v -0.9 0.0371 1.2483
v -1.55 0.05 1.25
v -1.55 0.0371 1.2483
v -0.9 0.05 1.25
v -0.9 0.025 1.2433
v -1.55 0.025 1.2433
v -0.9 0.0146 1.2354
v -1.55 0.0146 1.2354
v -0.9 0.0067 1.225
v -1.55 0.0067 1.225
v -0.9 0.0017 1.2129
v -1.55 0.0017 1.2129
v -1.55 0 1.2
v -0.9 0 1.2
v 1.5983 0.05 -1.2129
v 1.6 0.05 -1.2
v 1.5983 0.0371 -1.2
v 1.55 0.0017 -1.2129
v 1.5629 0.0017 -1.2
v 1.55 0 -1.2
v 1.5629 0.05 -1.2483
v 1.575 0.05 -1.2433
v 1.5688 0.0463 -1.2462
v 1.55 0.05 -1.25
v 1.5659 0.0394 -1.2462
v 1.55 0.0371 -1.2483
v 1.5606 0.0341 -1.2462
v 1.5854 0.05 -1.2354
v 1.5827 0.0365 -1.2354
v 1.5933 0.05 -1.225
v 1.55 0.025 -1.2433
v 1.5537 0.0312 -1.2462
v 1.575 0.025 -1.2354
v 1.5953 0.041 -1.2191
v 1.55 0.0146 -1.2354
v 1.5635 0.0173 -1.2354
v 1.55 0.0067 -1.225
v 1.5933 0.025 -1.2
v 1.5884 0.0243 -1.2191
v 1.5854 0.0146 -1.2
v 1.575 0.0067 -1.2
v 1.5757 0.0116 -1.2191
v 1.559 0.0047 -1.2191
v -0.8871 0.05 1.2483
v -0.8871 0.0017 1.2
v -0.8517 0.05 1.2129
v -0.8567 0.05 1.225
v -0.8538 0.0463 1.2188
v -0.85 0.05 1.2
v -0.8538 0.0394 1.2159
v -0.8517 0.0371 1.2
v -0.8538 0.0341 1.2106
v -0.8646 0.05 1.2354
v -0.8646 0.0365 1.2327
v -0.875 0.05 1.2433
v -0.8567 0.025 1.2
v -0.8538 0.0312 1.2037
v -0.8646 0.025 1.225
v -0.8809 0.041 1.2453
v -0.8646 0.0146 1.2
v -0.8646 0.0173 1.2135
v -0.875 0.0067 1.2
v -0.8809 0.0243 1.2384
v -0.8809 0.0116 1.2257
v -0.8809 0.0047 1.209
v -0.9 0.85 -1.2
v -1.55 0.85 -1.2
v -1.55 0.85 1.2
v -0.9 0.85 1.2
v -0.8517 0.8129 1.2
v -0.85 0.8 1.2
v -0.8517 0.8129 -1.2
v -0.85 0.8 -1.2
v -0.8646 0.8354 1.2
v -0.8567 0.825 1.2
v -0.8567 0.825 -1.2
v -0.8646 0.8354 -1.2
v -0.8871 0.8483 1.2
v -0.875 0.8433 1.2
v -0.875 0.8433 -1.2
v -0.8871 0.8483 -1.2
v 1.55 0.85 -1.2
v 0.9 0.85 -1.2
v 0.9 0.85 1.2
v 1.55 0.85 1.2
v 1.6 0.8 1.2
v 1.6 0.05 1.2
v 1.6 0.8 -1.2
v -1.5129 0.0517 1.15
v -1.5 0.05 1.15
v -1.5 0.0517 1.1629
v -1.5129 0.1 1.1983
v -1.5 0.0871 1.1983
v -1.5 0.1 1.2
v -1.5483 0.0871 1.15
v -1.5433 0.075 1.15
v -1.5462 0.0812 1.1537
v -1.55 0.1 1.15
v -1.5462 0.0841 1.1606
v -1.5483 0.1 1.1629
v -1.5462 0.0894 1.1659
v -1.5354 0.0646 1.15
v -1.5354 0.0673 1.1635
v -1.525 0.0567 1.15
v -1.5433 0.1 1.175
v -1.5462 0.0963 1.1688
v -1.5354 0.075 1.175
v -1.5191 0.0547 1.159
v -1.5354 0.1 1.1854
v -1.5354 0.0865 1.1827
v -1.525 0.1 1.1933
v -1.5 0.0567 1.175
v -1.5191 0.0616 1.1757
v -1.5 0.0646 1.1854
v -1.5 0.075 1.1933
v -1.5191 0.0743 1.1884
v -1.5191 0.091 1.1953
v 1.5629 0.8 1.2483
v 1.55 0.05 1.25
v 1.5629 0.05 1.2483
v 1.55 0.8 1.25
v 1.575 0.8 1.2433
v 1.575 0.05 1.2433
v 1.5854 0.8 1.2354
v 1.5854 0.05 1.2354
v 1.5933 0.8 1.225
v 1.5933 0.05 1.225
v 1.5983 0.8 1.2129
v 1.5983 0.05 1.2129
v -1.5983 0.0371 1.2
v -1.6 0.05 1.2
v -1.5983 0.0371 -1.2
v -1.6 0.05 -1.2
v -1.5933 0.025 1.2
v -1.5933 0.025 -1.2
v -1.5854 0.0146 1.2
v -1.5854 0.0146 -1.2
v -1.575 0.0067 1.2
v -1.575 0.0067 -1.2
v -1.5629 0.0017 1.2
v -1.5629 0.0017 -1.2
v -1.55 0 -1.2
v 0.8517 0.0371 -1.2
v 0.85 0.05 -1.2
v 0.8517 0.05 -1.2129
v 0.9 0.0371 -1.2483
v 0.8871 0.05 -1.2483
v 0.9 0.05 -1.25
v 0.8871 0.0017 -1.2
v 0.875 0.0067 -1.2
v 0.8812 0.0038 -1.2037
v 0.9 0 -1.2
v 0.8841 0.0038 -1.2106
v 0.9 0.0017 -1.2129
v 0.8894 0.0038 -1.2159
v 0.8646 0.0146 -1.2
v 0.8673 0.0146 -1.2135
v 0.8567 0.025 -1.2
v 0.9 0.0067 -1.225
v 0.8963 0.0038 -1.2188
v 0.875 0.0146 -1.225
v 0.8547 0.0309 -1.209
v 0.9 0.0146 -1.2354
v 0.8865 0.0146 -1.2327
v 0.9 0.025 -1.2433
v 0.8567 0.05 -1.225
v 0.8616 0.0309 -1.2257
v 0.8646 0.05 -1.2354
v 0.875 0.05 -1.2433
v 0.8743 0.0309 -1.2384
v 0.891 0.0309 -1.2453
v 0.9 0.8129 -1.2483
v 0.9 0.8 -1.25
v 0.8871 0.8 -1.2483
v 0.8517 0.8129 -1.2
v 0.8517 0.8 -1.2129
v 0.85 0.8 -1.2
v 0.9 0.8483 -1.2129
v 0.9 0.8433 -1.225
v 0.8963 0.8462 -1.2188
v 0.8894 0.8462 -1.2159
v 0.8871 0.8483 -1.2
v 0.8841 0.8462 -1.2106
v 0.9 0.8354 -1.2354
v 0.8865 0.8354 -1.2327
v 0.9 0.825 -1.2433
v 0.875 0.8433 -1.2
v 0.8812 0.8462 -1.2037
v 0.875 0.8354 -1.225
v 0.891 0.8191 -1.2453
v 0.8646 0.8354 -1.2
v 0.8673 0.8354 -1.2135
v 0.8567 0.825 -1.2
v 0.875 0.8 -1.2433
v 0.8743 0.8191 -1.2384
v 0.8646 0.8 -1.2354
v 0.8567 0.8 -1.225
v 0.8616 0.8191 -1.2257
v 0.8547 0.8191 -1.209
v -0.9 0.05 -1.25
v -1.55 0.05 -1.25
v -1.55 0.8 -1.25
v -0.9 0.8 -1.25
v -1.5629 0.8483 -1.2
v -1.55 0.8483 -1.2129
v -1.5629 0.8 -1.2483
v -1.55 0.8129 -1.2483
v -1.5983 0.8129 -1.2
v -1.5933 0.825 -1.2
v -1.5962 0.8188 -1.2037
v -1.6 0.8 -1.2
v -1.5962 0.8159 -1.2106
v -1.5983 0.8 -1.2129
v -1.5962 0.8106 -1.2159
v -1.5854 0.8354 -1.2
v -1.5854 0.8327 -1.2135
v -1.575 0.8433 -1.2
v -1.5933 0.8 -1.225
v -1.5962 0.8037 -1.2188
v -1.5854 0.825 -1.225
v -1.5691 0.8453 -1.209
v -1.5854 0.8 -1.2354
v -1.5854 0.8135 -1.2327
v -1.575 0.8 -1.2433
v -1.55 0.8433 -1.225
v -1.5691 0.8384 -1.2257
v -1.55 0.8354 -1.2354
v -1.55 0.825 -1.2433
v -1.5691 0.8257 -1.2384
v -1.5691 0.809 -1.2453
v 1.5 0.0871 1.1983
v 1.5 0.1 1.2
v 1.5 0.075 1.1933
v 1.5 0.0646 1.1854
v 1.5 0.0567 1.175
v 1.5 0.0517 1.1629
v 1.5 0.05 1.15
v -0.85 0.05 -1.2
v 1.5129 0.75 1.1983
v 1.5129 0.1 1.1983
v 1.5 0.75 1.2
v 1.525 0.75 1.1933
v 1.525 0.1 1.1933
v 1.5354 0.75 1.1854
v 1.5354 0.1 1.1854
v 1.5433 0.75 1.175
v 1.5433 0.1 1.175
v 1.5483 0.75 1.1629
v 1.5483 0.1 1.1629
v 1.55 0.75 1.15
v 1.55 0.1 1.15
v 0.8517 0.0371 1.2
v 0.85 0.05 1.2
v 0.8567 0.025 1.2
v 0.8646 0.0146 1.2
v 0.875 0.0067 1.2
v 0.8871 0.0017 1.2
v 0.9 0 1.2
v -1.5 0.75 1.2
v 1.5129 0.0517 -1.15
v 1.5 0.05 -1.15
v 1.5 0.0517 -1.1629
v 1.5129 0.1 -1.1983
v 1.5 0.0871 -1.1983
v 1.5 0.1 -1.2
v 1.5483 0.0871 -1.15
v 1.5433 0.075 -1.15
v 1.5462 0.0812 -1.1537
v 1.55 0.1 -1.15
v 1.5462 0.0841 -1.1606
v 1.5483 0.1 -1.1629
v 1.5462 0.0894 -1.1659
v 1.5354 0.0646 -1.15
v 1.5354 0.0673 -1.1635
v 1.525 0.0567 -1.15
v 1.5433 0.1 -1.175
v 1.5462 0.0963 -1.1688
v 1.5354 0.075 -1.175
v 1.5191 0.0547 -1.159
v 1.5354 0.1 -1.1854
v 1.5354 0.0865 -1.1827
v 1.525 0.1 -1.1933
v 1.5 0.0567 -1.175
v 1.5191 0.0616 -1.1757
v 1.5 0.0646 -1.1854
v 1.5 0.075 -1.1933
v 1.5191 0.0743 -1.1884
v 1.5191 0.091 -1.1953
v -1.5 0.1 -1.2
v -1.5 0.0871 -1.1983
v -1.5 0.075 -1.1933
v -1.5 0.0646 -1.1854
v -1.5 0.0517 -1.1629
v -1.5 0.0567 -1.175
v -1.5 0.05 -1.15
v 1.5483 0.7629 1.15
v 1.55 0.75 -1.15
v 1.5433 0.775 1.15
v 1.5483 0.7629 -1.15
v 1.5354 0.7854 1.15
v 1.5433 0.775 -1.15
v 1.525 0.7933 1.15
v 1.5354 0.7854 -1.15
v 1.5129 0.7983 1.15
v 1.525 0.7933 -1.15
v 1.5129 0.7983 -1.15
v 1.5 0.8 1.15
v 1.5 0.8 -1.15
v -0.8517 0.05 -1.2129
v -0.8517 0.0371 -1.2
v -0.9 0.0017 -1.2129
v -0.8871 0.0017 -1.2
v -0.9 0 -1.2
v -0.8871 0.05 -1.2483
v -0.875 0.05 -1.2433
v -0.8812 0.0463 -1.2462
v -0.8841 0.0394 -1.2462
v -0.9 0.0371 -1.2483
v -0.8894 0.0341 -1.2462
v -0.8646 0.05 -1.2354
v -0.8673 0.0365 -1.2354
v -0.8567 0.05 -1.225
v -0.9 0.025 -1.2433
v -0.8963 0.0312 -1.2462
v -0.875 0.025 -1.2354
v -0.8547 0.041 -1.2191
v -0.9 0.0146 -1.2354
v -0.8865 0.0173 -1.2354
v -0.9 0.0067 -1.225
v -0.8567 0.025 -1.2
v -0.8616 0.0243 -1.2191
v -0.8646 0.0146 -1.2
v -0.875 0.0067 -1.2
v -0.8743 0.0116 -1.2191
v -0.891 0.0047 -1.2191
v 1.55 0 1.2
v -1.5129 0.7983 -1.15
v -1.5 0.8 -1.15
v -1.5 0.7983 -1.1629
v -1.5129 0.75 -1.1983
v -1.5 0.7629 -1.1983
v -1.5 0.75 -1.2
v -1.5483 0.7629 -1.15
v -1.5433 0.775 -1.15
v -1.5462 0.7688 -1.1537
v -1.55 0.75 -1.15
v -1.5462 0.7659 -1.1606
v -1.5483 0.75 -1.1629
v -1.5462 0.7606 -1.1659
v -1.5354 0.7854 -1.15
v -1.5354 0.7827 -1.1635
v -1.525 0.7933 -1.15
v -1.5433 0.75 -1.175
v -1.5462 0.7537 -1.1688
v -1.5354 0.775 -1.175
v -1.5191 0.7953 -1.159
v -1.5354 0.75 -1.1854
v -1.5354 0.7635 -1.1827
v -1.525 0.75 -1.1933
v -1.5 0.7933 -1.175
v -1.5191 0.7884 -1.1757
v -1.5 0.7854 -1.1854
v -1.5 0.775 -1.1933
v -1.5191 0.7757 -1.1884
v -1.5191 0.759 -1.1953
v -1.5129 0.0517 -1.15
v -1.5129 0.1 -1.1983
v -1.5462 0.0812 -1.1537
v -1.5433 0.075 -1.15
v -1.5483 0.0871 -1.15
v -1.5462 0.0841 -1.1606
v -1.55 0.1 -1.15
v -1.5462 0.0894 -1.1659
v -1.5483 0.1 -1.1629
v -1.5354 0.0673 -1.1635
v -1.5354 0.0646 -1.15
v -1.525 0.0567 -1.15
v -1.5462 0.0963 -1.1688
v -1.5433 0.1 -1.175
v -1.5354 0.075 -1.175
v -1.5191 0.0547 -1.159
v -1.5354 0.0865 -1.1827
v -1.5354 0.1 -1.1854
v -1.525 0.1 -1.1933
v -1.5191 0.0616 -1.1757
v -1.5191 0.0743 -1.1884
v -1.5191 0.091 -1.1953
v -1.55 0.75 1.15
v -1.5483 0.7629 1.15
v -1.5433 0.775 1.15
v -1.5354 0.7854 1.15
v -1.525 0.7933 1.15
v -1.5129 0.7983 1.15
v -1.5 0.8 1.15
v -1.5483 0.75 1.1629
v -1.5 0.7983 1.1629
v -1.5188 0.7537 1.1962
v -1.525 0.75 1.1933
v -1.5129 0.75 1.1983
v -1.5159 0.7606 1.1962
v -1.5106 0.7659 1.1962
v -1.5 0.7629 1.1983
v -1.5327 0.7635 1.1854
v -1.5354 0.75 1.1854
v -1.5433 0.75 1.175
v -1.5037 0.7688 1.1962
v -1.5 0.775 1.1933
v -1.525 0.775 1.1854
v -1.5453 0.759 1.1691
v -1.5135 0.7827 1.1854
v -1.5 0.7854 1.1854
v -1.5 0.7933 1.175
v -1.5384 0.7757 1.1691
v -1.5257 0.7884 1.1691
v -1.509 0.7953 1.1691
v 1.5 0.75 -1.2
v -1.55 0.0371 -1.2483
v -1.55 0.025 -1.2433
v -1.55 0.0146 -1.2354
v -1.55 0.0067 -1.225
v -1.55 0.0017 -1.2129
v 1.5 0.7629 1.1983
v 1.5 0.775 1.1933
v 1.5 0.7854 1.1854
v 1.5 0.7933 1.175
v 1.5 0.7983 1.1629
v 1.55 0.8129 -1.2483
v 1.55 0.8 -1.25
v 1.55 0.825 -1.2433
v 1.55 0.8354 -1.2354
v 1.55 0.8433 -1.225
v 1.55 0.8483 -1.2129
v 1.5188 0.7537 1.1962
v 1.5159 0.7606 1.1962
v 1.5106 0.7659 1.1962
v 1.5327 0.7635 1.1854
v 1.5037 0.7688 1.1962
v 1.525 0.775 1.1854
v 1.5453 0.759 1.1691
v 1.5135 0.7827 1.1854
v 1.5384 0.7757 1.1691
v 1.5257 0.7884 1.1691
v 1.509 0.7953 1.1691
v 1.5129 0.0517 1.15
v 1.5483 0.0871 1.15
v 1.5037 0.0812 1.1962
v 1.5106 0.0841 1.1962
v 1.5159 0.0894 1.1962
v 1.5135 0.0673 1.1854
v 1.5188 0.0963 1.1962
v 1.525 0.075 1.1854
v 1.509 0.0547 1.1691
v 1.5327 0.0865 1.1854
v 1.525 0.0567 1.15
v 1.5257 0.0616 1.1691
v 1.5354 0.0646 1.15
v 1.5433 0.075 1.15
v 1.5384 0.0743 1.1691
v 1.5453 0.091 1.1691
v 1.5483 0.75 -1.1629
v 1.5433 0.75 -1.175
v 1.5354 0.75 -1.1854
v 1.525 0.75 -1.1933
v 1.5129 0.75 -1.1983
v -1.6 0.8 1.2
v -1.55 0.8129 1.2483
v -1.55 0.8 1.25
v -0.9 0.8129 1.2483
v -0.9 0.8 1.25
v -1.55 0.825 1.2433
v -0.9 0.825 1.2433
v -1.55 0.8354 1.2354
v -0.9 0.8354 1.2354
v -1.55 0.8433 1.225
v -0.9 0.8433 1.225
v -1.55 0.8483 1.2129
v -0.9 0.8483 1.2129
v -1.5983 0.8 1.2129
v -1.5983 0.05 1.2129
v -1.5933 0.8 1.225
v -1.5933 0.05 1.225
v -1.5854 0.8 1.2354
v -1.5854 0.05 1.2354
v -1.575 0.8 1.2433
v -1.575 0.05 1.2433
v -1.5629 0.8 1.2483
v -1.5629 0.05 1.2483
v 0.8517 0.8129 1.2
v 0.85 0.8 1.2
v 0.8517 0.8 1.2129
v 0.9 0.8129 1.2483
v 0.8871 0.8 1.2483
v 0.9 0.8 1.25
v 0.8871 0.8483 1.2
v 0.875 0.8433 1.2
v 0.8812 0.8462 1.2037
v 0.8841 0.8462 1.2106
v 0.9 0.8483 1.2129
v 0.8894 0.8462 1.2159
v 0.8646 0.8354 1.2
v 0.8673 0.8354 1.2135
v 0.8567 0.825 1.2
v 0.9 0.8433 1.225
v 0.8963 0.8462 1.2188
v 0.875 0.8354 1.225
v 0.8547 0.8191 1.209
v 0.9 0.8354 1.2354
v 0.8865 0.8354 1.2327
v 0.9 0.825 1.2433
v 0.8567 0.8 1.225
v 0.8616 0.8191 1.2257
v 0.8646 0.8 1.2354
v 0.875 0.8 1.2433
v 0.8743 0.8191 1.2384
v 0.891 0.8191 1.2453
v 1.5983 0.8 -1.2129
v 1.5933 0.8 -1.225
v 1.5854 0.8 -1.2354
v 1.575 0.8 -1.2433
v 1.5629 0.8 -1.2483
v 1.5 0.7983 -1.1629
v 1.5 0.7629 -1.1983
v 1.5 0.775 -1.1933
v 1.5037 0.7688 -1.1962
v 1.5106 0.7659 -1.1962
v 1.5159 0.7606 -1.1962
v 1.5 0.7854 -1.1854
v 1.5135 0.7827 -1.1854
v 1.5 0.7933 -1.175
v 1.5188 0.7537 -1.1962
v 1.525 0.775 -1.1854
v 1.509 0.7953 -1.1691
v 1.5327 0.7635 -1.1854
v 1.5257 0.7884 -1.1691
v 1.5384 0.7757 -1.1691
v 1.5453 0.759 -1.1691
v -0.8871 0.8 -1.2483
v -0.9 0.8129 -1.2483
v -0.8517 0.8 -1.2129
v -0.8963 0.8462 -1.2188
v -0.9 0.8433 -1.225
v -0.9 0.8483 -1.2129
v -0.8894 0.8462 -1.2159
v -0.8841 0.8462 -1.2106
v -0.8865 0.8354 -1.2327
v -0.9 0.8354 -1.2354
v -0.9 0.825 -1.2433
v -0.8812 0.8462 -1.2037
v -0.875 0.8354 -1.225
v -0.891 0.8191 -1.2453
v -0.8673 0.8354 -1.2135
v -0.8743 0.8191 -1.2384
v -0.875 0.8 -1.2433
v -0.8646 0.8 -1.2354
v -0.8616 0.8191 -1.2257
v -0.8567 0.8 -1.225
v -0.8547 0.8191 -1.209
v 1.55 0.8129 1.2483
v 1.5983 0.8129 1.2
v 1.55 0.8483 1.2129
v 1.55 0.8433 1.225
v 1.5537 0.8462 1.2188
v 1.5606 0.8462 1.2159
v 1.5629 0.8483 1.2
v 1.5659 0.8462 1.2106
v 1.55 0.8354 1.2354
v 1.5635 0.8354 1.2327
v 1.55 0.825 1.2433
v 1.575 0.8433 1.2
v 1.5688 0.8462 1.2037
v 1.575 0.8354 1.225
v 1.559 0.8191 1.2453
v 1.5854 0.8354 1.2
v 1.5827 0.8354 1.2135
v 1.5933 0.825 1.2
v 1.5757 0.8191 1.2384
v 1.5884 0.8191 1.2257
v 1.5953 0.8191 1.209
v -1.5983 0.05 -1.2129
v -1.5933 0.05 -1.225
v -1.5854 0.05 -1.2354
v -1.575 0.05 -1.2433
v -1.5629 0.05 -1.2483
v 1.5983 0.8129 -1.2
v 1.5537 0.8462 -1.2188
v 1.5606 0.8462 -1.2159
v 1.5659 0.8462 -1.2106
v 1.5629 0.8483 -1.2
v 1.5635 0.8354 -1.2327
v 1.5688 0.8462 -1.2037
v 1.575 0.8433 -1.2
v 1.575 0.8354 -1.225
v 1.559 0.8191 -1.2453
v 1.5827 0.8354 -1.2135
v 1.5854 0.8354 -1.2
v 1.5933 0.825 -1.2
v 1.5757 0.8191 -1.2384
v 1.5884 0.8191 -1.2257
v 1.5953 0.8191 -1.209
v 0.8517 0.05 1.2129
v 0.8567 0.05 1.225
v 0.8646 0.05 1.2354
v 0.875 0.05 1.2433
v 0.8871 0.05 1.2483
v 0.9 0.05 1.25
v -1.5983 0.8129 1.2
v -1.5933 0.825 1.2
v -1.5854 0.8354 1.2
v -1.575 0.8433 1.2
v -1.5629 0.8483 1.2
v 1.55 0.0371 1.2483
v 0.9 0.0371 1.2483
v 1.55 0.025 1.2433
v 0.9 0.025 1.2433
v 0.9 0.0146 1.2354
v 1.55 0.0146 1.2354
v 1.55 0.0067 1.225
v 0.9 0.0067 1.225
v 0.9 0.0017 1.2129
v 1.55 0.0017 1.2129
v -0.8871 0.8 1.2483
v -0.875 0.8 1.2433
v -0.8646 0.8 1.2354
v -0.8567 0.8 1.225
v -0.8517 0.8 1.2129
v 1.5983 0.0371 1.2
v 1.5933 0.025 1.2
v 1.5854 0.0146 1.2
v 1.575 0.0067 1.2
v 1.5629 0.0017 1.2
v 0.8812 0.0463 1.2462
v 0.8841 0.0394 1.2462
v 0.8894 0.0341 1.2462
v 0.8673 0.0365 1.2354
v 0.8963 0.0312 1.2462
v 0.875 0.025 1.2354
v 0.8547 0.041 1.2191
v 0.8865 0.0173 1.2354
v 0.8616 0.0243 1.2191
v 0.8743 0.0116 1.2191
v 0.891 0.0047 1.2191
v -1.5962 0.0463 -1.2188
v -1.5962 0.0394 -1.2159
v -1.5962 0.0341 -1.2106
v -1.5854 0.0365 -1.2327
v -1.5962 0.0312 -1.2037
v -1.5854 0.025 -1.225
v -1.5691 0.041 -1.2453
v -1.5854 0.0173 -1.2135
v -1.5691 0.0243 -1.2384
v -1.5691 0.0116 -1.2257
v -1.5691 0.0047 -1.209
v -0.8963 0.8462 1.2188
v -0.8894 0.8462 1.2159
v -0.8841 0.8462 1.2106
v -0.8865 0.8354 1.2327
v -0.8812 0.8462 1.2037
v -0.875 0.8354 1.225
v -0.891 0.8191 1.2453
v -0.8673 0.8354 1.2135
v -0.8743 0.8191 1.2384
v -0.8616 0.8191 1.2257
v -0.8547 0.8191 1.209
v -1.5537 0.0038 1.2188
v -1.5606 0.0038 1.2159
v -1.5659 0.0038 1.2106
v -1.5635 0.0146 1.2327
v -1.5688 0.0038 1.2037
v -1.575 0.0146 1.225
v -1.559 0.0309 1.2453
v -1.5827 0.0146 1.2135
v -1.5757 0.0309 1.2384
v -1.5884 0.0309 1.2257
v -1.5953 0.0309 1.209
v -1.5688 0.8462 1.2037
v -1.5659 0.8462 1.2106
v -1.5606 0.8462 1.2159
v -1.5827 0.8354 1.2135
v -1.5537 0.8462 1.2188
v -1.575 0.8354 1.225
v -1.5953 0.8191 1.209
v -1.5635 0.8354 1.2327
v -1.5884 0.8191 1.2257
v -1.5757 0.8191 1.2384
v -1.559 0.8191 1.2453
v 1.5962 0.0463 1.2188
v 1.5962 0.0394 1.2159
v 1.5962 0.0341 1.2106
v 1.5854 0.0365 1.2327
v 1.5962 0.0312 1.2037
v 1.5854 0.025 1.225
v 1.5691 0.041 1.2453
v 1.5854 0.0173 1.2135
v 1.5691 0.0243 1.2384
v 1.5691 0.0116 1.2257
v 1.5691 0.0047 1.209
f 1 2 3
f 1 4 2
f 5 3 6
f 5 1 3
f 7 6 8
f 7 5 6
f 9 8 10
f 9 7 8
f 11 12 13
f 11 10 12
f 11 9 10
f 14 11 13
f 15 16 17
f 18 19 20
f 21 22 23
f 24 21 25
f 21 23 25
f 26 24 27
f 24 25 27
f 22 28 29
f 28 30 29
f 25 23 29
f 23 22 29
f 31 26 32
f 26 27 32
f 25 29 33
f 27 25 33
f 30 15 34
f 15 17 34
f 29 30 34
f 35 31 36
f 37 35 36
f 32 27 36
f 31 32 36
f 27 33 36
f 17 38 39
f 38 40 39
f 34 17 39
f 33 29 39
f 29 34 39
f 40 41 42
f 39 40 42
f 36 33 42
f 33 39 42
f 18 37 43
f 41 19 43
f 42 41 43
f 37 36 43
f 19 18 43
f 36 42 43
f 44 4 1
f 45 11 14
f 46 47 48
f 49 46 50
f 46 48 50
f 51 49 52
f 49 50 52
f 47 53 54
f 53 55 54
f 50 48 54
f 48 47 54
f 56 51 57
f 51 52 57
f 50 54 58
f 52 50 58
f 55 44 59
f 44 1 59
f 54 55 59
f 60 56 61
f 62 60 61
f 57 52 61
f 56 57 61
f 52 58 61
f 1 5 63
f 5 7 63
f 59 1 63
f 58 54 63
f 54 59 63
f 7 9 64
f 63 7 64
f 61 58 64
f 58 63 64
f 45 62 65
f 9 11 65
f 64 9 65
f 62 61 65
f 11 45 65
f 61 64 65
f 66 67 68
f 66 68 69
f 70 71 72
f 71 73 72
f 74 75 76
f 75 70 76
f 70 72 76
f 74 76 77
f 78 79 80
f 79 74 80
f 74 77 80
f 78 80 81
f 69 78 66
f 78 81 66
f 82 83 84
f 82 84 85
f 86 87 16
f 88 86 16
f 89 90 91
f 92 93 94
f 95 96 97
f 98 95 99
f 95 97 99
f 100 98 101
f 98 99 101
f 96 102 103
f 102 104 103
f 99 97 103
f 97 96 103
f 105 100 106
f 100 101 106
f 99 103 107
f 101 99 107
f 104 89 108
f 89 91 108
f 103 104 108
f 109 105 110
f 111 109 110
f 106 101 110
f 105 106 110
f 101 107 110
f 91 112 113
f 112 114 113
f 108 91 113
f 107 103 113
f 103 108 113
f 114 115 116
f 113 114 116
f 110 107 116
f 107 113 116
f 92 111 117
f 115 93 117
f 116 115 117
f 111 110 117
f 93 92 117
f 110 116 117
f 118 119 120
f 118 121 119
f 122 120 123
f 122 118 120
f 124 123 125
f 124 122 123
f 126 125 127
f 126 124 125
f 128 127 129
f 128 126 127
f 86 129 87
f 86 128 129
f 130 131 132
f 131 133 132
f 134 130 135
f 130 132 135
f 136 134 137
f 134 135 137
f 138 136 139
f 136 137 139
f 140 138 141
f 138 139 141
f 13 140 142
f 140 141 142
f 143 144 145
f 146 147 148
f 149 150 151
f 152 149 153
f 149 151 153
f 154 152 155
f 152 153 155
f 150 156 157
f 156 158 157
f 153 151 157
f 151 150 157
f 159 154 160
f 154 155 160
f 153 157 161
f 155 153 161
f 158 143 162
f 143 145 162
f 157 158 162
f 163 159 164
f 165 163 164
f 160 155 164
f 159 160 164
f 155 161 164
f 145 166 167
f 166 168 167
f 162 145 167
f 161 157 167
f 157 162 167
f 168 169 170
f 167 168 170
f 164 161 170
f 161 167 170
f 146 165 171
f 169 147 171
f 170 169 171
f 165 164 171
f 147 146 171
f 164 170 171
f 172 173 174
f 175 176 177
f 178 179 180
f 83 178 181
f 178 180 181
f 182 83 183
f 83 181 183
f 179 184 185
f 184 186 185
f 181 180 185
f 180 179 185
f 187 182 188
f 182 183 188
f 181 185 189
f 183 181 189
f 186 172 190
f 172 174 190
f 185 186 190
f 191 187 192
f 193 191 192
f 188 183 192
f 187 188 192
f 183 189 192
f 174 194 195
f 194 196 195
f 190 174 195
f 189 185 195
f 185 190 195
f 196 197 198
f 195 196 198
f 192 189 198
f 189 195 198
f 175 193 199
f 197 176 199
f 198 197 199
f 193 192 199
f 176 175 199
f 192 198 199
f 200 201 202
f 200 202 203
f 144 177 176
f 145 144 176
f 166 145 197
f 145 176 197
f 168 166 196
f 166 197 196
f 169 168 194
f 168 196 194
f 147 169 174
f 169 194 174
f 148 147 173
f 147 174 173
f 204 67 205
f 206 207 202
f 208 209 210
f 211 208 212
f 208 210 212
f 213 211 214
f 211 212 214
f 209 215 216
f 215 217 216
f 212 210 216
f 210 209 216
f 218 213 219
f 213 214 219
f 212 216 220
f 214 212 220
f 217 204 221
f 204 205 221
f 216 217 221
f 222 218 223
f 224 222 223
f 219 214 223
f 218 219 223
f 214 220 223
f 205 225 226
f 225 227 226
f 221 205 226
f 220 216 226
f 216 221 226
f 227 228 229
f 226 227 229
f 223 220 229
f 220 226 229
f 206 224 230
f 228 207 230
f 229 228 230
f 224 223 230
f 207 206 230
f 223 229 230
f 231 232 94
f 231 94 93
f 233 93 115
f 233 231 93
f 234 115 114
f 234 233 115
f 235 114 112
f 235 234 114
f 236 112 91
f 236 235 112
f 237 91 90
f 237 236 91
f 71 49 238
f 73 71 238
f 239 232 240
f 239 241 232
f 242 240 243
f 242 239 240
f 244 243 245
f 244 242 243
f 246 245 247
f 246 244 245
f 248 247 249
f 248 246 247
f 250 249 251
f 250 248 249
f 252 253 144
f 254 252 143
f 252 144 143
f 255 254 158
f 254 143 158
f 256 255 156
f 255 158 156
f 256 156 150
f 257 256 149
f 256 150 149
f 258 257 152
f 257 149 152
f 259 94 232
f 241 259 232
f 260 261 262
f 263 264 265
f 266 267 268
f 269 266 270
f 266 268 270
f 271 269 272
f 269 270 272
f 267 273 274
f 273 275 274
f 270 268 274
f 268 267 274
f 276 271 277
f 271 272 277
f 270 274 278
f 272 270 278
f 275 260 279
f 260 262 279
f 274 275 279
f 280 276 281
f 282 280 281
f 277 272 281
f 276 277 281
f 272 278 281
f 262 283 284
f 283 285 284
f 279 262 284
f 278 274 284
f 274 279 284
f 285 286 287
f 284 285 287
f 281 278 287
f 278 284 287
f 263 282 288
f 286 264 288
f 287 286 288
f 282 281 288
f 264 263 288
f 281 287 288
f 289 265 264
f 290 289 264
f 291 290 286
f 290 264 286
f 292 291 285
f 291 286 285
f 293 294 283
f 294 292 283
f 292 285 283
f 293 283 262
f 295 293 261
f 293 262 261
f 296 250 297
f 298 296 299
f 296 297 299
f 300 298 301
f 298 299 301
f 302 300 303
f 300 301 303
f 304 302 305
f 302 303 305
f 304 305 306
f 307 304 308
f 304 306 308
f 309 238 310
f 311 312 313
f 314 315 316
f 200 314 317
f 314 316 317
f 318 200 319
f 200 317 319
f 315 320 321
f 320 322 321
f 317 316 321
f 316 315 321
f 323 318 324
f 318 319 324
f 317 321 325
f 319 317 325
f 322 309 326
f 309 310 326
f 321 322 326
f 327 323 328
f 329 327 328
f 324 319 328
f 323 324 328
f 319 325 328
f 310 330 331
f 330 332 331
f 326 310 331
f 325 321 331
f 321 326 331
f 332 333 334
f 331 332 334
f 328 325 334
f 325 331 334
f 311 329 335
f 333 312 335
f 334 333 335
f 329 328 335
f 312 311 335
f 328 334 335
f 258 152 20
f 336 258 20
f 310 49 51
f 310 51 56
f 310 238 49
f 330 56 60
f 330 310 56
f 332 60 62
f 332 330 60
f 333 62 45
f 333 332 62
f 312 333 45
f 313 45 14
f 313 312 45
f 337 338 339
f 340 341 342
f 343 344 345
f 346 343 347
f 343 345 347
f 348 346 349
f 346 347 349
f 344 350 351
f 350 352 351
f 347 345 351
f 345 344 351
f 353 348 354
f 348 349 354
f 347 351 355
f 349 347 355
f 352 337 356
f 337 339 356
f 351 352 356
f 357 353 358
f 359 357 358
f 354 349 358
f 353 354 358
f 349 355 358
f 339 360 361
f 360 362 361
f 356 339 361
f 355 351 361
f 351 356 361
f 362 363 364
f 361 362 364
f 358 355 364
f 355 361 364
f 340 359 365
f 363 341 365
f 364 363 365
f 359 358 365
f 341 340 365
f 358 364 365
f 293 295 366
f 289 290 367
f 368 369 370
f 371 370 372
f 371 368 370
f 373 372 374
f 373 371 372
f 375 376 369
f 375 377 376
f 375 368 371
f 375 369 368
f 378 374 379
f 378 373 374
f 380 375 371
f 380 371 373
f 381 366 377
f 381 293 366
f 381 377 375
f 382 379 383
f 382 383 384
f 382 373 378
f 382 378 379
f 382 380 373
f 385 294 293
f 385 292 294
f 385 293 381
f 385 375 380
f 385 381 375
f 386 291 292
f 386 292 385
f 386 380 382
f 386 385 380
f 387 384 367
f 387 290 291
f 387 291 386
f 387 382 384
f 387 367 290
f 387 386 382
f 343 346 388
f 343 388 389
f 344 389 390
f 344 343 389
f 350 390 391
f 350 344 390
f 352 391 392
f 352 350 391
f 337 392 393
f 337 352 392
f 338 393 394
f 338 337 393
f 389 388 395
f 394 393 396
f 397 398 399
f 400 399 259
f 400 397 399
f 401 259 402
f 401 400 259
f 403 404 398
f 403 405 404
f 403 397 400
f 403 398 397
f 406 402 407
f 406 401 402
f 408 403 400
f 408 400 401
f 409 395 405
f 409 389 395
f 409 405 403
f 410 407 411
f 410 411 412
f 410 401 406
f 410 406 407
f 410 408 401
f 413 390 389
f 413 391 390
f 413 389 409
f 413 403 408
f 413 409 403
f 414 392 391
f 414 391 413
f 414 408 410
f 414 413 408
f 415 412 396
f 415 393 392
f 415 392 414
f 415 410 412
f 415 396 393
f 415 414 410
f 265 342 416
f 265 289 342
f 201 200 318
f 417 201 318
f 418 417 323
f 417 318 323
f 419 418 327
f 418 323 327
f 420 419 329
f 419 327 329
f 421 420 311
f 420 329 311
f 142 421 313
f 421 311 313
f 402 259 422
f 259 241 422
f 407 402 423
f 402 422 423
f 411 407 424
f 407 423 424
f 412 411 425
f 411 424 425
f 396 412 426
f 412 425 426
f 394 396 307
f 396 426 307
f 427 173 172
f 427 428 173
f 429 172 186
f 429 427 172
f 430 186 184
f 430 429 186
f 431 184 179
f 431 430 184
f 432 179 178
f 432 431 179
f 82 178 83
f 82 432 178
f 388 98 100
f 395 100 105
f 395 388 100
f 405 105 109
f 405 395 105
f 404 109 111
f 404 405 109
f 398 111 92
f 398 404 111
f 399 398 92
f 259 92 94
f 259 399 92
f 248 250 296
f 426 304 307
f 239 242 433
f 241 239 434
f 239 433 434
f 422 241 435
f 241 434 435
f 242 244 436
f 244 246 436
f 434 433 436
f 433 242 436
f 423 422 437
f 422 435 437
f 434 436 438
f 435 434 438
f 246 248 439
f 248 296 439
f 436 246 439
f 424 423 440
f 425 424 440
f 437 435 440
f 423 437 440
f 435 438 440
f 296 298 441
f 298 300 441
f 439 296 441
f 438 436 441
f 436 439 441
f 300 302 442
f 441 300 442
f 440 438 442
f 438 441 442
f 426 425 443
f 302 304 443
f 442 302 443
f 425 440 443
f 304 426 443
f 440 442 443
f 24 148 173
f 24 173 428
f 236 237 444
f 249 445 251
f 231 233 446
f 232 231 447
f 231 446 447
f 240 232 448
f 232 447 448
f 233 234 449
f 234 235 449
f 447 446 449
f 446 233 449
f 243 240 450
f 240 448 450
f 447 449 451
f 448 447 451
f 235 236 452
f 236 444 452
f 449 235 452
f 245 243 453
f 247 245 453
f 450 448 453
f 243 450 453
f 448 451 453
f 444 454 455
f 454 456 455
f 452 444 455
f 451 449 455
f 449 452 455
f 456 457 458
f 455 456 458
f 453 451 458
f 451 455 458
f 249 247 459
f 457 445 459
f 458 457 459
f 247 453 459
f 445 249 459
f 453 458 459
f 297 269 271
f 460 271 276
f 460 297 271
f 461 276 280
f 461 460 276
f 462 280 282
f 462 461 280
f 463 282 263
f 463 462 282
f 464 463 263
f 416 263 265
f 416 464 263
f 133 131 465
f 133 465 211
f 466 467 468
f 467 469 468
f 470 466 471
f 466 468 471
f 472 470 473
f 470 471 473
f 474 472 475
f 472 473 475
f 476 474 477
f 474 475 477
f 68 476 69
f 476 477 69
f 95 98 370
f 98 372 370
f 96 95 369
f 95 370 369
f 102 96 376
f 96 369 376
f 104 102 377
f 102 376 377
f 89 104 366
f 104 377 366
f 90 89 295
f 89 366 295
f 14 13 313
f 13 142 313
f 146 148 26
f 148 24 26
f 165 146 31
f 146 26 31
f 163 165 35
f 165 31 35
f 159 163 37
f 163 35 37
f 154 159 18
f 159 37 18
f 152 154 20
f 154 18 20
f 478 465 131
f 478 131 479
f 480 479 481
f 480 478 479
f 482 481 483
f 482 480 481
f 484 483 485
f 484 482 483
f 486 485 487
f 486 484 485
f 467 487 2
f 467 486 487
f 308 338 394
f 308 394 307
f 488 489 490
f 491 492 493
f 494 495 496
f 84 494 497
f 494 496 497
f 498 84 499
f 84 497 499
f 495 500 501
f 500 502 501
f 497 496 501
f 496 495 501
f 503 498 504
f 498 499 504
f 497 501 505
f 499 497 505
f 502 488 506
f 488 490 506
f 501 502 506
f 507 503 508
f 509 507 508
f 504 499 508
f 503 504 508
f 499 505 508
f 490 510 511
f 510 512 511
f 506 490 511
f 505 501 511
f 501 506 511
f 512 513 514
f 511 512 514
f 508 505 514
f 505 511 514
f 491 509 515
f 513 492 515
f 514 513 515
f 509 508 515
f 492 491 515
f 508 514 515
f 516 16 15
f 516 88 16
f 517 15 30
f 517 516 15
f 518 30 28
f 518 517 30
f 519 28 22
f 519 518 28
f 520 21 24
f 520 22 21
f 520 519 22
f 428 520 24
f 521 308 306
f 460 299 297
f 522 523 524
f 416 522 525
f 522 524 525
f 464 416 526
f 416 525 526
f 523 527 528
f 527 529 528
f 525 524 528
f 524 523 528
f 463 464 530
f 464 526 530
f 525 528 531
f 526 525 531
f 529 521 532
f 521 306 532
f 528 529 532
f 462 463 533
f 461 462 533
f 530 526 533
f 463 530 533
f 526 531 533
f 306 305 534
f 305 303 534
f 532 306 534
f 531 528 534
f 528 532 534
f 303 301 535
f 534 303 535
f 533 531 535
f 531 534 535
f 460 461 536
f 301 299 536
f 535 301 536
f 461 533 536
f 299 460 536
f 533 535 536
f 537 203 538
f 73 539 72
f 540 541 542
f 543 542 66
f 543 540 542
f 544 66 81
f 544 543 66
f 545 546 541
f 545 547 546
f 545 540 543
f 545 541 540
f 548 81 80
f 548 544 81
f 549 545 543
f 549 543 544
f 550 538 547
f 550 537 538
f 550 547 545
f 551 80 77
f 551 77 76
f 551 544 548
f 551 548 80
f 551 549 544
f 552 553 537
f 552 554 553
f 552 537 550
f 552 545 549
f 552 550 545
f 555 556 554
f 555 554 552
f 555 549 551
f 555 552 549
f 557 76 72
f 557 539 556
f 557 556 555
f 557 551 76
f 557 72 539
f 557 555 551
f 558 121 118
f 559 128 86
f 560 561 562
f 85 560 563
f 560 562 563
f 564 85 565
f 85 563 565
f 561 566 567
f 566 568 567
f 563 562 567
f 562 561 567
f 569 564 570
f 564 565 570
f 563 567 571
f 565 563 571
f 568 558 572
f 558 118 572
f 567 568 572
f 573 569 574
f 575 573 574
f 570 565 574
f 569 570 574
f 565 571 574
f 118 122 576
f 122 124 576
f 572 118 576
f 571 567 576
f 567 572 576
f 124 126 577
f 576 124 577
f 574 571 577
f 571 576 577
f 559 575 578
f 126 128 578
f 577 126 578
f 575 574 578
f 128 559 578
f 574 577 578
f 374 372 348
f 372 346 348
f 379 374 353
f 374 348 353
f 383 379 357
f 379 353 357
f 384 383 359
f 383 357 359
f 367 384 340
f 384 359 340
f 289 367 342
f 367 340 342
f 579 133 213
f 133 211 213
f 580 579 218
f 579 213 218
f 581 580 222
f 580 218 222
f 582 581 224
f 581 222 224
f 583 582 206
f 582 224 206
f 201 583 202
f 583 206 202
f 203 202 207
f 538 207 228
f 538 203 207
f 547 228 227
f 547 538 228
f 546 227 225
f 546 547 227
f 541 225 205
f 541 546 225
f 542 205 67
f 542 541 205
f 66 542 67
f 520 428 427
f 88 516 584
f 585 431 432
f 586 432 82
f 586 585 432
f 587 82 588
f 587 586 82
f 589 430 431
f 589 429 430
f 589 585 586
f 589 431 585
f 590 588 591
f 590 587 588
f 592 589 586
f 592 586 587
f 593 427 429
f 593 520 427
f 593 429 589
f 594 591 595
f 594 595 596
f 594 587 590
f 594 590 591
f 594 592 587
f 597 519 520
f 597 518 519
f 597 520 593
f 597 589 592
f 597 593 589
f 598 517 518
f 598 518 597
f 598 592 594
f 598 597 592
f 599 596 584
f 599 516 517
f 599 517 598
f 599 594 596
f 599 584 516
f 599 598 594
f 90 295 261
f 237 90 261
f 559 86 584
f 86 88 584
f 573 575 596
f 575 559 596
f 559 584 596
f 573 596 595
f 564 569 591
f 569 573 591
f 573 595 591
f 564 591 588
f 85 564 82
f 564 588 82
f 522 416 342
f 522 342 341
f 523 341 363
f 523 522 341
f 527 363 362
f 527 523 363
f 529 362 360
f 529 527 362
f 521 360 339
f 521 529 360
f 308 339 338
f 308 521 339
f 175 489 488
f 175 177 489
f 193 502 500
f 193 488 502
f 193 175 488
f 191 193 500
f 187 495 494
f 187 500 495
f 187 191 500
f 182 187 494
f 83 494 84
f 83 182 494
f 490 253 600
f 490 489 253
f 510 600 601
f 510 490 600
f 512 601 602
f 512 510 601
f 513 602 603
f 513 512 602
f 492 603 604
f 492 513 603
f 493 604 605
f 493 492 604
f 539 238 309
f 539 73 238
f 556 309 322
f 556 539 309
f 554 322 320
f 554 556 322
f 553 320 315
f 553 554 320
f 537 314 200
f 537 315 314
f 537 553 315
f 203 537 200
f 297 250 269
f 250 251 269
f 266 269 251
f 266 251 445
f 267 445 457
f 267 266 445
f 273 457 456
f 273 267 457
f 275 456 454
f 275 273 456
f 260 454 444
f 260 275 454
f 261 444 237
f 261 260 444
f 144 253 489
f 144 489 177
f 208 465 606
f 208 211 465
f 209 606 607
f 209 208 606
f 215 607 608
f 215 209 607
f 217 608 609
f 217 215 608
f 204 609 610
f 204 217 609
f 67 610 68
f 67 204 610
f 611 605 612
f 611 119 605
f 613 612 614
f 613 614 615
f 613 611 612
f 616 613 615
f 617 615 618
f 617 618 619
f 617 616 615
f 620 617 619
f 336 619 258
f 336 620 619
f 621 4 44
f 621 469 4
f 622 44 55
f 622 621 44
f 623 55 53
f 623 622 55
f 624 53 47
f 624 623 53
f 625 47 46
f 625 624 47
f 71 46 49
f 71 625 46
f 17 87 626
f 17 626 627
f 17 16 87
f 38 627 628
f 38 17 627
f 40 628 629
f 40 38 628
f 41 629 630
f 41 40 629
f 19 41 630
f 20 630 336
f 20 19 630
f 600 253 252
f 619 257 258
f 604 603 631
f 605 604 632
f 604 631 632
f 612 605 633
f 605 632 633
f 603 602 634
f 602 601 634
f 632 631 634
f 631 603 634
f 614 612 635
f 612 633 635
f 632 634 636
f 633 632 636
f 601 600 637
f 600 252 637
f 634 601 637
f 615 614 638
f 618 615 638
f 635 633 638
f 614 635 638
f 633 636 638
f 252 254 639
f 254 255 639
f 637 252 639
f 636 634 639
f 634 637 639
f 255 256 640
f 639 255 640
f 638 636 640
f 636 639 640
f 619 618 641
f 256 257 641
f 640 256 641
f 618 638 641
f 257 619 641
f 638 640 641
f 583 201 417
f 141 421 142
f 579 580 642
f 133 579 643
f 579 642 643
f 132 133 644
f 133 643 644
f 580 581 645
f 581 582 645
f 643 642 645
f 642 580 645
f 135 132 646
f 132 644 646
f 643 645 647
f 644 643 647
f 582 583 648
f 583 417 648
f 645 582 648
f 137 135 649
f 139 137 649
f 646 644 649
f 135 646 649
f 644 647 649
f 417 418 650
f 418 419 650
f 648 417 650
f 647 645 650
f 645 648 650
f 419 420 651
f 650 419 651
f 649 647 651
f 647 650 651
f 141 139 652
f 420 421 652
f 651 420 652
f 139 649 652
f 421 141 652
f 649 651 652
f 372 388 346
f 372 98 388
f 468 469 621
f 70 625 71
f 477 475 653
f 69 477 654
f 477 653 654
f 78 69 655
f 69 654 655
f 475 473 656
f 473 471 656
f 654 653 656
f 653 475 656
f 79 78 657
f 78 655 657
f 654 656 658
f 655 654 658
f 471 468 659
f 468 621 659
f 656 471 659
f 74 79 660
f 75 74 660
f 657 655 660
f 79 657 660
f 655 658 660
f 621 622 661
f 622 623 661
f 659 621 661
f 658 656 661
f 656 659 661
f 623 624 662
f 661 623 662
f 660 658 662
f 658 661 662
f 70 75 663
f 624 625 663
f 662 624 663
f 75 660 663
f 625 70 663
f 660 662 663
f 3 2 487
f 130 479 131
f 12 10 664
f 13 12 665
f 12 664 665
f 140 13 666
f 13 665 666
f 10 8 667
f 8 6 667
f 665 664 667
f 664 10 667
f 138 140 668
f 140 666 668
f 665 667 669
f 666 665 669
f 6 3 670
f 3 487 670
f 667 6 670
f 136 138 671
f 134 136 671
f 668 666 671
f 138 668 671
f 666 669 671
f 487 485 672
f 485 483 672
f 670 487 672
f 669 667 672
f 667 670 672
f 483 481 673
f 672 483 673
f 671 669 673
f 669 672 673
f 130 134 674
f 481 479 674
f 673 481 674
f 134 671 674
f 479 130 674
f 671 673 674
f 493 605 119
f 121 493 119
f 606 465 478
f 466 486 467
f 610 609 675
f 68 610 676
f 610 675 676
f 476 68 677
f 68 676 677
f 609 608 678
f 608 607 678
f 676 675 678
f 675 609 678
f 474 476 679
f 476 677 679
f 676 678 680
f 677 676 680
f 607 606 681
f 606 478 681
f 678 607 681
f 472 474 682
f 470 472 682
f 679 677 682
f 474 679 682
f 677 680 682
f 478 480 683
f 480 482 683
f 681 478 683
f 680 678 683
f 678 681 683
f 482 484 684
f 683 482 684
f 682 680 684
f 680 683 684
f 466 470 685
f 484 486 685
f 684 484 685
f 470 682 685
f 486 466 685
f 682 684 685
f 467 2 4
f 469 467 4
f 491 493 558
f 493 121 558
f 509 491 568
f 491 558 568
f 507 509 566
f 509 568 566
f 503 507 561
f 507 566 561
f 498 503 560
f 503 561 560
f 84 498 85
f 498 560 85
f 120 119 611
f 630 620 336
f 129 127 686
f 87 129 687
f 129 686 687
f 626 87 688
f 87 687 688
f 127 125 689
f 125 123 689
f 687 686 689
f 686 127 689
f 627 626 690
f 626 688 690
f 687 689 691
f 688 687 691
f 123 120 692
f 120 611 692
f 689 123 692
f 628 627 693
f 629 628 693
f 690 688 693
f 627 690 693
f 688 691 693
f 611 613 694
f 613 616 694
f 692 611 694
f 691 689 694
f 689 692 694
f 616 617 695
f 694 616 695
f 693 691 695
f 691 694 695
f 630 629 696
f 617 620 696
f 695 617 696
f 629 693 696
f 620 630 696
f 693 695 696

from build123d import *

# Parameters (mm, degrees)
SKETCH1_W             = 3.1
SKETCH1_H             = 2.4
BOSS_EXTRUDE1_DEPTH   = 0.75
SKETCH2_W             = 0.75
SKETCH2_H             = 2.5
BOSS_EXTRUDE2_DEPTH   = 0.85
BOSS_EXTRUDE2_2_DEPTH = 0.85
FILLET1_R             = 0.05
FILLET2_R             = 0.05
FILLET3_R             = 0.05


with BuildPart() as part:
    # Sketch1 → Boss-Extrude1 (new body)
    with BuildSketch(Plane(origin=(0, 0.05, 0), x_dir=(1, 0, 0), z_dir=(0, 1, 0))):
        Rectangle(SKETCH1_W, SKETCH1_H)
    extrude(amount=BOSS_EXTRUDE1_DEPTH)

    # Fillet3
    fillet3_edges = [part.edges().sort_by_distance(p)[0] for p in [
        (1.55, 0.8, 0),
        (0, 0.8, -1.2),
        (-1.55, 0.8, 0),
        (0, 0.05, -1.2),
        (1.55, 0.05, 0),
        (0, 0.05, 1.2),
        (-1.55, 0.05, 0),
        (-1.55, 0.425, -1.2),
        (1.55, 0.425, -1.2),
        (1.55, 0.425, 1.2),
        (-1.55, 0.425, 1.2),
        (0, 0.8, 1.2),
    ]]
    fillet(fillet3_edges, radius=FILLET3_R)


with BuildPart() as body_2:
    # Sketch2 → Boss-Extrude2 (new body)
    with BuildSketch(Plane(origin=(0, 0, 0), x_dir=(1, 0, 0), z_dir=(0, 1, 0))):
        with Locations((-1.225, 0)):
            Rectangle(SKETCH2_W, SKETCH2_H)
    extrude(amount=BOSS_EXTRUDE2_DEPTH)

    # Fillet2
    fillet2_edges = [body_2.edges().sort_by_distance(p)[0] for p in [
        (-1.6, 0.425, 1.25),
        (-1.225, 0, 1.25),
        (-0.85, 0.425, 1.25),
        (-0.85, 0, 0),
        (-0.85, 0.425, -1.25),
        (-1.225, 0, -1.25),
        (-1.225, 0.85, -1.25),
        (-1.6, 0.85, 0),
        (-1.225, 0.85, 1.25),
        (-0.85, 0.85, 0),
        (-1.6, 0.425, -1.25),
        (-1.6, 0, 0),
    ]]
    fillet(fillet2_edges, radius=FILLET2_R)


with BuildPart() as body_3:
    # Sketch2 → Boss-Extrude2 2 (new body)
    with BuildSketch(Plane(origin=(0, 0, 0), x_dir=(1, 0, 0), z_dir=(0, 1, 0))):
        with Locations((1.225, 0)):
            Rectangle(SKETCH2_W, SKETCH2_H)
    extrude(amount=BOSS_EXTRUDE2_2_DEPTH)

    # Fillet1
    fillet1_edges = [body_3.edges().sort_by_distance(p)[0] for p in [
        (0.85, 0.425, -1.25),
        (0.85, 0, 0),
        (0.85, 0.425, 1.25),
        (1.225, 0, 1.25),
        (1.6, 0.425, 1.25),
        (1.6, 0, 0),
        (1.6, 0.425, -1.25),
        (1.225, 0, -1.25),
        (1.225, 0.85, -1.25),
        (0.85, 0.85, 0),
        (1.225, 0.85, 1.25),
        (1.6, 0.85, 0),
    ]]
    fillet(fillet1_edges, radius=FILLET1_R)


solid = Compound([part.part, body_2.part, body_3.part])
